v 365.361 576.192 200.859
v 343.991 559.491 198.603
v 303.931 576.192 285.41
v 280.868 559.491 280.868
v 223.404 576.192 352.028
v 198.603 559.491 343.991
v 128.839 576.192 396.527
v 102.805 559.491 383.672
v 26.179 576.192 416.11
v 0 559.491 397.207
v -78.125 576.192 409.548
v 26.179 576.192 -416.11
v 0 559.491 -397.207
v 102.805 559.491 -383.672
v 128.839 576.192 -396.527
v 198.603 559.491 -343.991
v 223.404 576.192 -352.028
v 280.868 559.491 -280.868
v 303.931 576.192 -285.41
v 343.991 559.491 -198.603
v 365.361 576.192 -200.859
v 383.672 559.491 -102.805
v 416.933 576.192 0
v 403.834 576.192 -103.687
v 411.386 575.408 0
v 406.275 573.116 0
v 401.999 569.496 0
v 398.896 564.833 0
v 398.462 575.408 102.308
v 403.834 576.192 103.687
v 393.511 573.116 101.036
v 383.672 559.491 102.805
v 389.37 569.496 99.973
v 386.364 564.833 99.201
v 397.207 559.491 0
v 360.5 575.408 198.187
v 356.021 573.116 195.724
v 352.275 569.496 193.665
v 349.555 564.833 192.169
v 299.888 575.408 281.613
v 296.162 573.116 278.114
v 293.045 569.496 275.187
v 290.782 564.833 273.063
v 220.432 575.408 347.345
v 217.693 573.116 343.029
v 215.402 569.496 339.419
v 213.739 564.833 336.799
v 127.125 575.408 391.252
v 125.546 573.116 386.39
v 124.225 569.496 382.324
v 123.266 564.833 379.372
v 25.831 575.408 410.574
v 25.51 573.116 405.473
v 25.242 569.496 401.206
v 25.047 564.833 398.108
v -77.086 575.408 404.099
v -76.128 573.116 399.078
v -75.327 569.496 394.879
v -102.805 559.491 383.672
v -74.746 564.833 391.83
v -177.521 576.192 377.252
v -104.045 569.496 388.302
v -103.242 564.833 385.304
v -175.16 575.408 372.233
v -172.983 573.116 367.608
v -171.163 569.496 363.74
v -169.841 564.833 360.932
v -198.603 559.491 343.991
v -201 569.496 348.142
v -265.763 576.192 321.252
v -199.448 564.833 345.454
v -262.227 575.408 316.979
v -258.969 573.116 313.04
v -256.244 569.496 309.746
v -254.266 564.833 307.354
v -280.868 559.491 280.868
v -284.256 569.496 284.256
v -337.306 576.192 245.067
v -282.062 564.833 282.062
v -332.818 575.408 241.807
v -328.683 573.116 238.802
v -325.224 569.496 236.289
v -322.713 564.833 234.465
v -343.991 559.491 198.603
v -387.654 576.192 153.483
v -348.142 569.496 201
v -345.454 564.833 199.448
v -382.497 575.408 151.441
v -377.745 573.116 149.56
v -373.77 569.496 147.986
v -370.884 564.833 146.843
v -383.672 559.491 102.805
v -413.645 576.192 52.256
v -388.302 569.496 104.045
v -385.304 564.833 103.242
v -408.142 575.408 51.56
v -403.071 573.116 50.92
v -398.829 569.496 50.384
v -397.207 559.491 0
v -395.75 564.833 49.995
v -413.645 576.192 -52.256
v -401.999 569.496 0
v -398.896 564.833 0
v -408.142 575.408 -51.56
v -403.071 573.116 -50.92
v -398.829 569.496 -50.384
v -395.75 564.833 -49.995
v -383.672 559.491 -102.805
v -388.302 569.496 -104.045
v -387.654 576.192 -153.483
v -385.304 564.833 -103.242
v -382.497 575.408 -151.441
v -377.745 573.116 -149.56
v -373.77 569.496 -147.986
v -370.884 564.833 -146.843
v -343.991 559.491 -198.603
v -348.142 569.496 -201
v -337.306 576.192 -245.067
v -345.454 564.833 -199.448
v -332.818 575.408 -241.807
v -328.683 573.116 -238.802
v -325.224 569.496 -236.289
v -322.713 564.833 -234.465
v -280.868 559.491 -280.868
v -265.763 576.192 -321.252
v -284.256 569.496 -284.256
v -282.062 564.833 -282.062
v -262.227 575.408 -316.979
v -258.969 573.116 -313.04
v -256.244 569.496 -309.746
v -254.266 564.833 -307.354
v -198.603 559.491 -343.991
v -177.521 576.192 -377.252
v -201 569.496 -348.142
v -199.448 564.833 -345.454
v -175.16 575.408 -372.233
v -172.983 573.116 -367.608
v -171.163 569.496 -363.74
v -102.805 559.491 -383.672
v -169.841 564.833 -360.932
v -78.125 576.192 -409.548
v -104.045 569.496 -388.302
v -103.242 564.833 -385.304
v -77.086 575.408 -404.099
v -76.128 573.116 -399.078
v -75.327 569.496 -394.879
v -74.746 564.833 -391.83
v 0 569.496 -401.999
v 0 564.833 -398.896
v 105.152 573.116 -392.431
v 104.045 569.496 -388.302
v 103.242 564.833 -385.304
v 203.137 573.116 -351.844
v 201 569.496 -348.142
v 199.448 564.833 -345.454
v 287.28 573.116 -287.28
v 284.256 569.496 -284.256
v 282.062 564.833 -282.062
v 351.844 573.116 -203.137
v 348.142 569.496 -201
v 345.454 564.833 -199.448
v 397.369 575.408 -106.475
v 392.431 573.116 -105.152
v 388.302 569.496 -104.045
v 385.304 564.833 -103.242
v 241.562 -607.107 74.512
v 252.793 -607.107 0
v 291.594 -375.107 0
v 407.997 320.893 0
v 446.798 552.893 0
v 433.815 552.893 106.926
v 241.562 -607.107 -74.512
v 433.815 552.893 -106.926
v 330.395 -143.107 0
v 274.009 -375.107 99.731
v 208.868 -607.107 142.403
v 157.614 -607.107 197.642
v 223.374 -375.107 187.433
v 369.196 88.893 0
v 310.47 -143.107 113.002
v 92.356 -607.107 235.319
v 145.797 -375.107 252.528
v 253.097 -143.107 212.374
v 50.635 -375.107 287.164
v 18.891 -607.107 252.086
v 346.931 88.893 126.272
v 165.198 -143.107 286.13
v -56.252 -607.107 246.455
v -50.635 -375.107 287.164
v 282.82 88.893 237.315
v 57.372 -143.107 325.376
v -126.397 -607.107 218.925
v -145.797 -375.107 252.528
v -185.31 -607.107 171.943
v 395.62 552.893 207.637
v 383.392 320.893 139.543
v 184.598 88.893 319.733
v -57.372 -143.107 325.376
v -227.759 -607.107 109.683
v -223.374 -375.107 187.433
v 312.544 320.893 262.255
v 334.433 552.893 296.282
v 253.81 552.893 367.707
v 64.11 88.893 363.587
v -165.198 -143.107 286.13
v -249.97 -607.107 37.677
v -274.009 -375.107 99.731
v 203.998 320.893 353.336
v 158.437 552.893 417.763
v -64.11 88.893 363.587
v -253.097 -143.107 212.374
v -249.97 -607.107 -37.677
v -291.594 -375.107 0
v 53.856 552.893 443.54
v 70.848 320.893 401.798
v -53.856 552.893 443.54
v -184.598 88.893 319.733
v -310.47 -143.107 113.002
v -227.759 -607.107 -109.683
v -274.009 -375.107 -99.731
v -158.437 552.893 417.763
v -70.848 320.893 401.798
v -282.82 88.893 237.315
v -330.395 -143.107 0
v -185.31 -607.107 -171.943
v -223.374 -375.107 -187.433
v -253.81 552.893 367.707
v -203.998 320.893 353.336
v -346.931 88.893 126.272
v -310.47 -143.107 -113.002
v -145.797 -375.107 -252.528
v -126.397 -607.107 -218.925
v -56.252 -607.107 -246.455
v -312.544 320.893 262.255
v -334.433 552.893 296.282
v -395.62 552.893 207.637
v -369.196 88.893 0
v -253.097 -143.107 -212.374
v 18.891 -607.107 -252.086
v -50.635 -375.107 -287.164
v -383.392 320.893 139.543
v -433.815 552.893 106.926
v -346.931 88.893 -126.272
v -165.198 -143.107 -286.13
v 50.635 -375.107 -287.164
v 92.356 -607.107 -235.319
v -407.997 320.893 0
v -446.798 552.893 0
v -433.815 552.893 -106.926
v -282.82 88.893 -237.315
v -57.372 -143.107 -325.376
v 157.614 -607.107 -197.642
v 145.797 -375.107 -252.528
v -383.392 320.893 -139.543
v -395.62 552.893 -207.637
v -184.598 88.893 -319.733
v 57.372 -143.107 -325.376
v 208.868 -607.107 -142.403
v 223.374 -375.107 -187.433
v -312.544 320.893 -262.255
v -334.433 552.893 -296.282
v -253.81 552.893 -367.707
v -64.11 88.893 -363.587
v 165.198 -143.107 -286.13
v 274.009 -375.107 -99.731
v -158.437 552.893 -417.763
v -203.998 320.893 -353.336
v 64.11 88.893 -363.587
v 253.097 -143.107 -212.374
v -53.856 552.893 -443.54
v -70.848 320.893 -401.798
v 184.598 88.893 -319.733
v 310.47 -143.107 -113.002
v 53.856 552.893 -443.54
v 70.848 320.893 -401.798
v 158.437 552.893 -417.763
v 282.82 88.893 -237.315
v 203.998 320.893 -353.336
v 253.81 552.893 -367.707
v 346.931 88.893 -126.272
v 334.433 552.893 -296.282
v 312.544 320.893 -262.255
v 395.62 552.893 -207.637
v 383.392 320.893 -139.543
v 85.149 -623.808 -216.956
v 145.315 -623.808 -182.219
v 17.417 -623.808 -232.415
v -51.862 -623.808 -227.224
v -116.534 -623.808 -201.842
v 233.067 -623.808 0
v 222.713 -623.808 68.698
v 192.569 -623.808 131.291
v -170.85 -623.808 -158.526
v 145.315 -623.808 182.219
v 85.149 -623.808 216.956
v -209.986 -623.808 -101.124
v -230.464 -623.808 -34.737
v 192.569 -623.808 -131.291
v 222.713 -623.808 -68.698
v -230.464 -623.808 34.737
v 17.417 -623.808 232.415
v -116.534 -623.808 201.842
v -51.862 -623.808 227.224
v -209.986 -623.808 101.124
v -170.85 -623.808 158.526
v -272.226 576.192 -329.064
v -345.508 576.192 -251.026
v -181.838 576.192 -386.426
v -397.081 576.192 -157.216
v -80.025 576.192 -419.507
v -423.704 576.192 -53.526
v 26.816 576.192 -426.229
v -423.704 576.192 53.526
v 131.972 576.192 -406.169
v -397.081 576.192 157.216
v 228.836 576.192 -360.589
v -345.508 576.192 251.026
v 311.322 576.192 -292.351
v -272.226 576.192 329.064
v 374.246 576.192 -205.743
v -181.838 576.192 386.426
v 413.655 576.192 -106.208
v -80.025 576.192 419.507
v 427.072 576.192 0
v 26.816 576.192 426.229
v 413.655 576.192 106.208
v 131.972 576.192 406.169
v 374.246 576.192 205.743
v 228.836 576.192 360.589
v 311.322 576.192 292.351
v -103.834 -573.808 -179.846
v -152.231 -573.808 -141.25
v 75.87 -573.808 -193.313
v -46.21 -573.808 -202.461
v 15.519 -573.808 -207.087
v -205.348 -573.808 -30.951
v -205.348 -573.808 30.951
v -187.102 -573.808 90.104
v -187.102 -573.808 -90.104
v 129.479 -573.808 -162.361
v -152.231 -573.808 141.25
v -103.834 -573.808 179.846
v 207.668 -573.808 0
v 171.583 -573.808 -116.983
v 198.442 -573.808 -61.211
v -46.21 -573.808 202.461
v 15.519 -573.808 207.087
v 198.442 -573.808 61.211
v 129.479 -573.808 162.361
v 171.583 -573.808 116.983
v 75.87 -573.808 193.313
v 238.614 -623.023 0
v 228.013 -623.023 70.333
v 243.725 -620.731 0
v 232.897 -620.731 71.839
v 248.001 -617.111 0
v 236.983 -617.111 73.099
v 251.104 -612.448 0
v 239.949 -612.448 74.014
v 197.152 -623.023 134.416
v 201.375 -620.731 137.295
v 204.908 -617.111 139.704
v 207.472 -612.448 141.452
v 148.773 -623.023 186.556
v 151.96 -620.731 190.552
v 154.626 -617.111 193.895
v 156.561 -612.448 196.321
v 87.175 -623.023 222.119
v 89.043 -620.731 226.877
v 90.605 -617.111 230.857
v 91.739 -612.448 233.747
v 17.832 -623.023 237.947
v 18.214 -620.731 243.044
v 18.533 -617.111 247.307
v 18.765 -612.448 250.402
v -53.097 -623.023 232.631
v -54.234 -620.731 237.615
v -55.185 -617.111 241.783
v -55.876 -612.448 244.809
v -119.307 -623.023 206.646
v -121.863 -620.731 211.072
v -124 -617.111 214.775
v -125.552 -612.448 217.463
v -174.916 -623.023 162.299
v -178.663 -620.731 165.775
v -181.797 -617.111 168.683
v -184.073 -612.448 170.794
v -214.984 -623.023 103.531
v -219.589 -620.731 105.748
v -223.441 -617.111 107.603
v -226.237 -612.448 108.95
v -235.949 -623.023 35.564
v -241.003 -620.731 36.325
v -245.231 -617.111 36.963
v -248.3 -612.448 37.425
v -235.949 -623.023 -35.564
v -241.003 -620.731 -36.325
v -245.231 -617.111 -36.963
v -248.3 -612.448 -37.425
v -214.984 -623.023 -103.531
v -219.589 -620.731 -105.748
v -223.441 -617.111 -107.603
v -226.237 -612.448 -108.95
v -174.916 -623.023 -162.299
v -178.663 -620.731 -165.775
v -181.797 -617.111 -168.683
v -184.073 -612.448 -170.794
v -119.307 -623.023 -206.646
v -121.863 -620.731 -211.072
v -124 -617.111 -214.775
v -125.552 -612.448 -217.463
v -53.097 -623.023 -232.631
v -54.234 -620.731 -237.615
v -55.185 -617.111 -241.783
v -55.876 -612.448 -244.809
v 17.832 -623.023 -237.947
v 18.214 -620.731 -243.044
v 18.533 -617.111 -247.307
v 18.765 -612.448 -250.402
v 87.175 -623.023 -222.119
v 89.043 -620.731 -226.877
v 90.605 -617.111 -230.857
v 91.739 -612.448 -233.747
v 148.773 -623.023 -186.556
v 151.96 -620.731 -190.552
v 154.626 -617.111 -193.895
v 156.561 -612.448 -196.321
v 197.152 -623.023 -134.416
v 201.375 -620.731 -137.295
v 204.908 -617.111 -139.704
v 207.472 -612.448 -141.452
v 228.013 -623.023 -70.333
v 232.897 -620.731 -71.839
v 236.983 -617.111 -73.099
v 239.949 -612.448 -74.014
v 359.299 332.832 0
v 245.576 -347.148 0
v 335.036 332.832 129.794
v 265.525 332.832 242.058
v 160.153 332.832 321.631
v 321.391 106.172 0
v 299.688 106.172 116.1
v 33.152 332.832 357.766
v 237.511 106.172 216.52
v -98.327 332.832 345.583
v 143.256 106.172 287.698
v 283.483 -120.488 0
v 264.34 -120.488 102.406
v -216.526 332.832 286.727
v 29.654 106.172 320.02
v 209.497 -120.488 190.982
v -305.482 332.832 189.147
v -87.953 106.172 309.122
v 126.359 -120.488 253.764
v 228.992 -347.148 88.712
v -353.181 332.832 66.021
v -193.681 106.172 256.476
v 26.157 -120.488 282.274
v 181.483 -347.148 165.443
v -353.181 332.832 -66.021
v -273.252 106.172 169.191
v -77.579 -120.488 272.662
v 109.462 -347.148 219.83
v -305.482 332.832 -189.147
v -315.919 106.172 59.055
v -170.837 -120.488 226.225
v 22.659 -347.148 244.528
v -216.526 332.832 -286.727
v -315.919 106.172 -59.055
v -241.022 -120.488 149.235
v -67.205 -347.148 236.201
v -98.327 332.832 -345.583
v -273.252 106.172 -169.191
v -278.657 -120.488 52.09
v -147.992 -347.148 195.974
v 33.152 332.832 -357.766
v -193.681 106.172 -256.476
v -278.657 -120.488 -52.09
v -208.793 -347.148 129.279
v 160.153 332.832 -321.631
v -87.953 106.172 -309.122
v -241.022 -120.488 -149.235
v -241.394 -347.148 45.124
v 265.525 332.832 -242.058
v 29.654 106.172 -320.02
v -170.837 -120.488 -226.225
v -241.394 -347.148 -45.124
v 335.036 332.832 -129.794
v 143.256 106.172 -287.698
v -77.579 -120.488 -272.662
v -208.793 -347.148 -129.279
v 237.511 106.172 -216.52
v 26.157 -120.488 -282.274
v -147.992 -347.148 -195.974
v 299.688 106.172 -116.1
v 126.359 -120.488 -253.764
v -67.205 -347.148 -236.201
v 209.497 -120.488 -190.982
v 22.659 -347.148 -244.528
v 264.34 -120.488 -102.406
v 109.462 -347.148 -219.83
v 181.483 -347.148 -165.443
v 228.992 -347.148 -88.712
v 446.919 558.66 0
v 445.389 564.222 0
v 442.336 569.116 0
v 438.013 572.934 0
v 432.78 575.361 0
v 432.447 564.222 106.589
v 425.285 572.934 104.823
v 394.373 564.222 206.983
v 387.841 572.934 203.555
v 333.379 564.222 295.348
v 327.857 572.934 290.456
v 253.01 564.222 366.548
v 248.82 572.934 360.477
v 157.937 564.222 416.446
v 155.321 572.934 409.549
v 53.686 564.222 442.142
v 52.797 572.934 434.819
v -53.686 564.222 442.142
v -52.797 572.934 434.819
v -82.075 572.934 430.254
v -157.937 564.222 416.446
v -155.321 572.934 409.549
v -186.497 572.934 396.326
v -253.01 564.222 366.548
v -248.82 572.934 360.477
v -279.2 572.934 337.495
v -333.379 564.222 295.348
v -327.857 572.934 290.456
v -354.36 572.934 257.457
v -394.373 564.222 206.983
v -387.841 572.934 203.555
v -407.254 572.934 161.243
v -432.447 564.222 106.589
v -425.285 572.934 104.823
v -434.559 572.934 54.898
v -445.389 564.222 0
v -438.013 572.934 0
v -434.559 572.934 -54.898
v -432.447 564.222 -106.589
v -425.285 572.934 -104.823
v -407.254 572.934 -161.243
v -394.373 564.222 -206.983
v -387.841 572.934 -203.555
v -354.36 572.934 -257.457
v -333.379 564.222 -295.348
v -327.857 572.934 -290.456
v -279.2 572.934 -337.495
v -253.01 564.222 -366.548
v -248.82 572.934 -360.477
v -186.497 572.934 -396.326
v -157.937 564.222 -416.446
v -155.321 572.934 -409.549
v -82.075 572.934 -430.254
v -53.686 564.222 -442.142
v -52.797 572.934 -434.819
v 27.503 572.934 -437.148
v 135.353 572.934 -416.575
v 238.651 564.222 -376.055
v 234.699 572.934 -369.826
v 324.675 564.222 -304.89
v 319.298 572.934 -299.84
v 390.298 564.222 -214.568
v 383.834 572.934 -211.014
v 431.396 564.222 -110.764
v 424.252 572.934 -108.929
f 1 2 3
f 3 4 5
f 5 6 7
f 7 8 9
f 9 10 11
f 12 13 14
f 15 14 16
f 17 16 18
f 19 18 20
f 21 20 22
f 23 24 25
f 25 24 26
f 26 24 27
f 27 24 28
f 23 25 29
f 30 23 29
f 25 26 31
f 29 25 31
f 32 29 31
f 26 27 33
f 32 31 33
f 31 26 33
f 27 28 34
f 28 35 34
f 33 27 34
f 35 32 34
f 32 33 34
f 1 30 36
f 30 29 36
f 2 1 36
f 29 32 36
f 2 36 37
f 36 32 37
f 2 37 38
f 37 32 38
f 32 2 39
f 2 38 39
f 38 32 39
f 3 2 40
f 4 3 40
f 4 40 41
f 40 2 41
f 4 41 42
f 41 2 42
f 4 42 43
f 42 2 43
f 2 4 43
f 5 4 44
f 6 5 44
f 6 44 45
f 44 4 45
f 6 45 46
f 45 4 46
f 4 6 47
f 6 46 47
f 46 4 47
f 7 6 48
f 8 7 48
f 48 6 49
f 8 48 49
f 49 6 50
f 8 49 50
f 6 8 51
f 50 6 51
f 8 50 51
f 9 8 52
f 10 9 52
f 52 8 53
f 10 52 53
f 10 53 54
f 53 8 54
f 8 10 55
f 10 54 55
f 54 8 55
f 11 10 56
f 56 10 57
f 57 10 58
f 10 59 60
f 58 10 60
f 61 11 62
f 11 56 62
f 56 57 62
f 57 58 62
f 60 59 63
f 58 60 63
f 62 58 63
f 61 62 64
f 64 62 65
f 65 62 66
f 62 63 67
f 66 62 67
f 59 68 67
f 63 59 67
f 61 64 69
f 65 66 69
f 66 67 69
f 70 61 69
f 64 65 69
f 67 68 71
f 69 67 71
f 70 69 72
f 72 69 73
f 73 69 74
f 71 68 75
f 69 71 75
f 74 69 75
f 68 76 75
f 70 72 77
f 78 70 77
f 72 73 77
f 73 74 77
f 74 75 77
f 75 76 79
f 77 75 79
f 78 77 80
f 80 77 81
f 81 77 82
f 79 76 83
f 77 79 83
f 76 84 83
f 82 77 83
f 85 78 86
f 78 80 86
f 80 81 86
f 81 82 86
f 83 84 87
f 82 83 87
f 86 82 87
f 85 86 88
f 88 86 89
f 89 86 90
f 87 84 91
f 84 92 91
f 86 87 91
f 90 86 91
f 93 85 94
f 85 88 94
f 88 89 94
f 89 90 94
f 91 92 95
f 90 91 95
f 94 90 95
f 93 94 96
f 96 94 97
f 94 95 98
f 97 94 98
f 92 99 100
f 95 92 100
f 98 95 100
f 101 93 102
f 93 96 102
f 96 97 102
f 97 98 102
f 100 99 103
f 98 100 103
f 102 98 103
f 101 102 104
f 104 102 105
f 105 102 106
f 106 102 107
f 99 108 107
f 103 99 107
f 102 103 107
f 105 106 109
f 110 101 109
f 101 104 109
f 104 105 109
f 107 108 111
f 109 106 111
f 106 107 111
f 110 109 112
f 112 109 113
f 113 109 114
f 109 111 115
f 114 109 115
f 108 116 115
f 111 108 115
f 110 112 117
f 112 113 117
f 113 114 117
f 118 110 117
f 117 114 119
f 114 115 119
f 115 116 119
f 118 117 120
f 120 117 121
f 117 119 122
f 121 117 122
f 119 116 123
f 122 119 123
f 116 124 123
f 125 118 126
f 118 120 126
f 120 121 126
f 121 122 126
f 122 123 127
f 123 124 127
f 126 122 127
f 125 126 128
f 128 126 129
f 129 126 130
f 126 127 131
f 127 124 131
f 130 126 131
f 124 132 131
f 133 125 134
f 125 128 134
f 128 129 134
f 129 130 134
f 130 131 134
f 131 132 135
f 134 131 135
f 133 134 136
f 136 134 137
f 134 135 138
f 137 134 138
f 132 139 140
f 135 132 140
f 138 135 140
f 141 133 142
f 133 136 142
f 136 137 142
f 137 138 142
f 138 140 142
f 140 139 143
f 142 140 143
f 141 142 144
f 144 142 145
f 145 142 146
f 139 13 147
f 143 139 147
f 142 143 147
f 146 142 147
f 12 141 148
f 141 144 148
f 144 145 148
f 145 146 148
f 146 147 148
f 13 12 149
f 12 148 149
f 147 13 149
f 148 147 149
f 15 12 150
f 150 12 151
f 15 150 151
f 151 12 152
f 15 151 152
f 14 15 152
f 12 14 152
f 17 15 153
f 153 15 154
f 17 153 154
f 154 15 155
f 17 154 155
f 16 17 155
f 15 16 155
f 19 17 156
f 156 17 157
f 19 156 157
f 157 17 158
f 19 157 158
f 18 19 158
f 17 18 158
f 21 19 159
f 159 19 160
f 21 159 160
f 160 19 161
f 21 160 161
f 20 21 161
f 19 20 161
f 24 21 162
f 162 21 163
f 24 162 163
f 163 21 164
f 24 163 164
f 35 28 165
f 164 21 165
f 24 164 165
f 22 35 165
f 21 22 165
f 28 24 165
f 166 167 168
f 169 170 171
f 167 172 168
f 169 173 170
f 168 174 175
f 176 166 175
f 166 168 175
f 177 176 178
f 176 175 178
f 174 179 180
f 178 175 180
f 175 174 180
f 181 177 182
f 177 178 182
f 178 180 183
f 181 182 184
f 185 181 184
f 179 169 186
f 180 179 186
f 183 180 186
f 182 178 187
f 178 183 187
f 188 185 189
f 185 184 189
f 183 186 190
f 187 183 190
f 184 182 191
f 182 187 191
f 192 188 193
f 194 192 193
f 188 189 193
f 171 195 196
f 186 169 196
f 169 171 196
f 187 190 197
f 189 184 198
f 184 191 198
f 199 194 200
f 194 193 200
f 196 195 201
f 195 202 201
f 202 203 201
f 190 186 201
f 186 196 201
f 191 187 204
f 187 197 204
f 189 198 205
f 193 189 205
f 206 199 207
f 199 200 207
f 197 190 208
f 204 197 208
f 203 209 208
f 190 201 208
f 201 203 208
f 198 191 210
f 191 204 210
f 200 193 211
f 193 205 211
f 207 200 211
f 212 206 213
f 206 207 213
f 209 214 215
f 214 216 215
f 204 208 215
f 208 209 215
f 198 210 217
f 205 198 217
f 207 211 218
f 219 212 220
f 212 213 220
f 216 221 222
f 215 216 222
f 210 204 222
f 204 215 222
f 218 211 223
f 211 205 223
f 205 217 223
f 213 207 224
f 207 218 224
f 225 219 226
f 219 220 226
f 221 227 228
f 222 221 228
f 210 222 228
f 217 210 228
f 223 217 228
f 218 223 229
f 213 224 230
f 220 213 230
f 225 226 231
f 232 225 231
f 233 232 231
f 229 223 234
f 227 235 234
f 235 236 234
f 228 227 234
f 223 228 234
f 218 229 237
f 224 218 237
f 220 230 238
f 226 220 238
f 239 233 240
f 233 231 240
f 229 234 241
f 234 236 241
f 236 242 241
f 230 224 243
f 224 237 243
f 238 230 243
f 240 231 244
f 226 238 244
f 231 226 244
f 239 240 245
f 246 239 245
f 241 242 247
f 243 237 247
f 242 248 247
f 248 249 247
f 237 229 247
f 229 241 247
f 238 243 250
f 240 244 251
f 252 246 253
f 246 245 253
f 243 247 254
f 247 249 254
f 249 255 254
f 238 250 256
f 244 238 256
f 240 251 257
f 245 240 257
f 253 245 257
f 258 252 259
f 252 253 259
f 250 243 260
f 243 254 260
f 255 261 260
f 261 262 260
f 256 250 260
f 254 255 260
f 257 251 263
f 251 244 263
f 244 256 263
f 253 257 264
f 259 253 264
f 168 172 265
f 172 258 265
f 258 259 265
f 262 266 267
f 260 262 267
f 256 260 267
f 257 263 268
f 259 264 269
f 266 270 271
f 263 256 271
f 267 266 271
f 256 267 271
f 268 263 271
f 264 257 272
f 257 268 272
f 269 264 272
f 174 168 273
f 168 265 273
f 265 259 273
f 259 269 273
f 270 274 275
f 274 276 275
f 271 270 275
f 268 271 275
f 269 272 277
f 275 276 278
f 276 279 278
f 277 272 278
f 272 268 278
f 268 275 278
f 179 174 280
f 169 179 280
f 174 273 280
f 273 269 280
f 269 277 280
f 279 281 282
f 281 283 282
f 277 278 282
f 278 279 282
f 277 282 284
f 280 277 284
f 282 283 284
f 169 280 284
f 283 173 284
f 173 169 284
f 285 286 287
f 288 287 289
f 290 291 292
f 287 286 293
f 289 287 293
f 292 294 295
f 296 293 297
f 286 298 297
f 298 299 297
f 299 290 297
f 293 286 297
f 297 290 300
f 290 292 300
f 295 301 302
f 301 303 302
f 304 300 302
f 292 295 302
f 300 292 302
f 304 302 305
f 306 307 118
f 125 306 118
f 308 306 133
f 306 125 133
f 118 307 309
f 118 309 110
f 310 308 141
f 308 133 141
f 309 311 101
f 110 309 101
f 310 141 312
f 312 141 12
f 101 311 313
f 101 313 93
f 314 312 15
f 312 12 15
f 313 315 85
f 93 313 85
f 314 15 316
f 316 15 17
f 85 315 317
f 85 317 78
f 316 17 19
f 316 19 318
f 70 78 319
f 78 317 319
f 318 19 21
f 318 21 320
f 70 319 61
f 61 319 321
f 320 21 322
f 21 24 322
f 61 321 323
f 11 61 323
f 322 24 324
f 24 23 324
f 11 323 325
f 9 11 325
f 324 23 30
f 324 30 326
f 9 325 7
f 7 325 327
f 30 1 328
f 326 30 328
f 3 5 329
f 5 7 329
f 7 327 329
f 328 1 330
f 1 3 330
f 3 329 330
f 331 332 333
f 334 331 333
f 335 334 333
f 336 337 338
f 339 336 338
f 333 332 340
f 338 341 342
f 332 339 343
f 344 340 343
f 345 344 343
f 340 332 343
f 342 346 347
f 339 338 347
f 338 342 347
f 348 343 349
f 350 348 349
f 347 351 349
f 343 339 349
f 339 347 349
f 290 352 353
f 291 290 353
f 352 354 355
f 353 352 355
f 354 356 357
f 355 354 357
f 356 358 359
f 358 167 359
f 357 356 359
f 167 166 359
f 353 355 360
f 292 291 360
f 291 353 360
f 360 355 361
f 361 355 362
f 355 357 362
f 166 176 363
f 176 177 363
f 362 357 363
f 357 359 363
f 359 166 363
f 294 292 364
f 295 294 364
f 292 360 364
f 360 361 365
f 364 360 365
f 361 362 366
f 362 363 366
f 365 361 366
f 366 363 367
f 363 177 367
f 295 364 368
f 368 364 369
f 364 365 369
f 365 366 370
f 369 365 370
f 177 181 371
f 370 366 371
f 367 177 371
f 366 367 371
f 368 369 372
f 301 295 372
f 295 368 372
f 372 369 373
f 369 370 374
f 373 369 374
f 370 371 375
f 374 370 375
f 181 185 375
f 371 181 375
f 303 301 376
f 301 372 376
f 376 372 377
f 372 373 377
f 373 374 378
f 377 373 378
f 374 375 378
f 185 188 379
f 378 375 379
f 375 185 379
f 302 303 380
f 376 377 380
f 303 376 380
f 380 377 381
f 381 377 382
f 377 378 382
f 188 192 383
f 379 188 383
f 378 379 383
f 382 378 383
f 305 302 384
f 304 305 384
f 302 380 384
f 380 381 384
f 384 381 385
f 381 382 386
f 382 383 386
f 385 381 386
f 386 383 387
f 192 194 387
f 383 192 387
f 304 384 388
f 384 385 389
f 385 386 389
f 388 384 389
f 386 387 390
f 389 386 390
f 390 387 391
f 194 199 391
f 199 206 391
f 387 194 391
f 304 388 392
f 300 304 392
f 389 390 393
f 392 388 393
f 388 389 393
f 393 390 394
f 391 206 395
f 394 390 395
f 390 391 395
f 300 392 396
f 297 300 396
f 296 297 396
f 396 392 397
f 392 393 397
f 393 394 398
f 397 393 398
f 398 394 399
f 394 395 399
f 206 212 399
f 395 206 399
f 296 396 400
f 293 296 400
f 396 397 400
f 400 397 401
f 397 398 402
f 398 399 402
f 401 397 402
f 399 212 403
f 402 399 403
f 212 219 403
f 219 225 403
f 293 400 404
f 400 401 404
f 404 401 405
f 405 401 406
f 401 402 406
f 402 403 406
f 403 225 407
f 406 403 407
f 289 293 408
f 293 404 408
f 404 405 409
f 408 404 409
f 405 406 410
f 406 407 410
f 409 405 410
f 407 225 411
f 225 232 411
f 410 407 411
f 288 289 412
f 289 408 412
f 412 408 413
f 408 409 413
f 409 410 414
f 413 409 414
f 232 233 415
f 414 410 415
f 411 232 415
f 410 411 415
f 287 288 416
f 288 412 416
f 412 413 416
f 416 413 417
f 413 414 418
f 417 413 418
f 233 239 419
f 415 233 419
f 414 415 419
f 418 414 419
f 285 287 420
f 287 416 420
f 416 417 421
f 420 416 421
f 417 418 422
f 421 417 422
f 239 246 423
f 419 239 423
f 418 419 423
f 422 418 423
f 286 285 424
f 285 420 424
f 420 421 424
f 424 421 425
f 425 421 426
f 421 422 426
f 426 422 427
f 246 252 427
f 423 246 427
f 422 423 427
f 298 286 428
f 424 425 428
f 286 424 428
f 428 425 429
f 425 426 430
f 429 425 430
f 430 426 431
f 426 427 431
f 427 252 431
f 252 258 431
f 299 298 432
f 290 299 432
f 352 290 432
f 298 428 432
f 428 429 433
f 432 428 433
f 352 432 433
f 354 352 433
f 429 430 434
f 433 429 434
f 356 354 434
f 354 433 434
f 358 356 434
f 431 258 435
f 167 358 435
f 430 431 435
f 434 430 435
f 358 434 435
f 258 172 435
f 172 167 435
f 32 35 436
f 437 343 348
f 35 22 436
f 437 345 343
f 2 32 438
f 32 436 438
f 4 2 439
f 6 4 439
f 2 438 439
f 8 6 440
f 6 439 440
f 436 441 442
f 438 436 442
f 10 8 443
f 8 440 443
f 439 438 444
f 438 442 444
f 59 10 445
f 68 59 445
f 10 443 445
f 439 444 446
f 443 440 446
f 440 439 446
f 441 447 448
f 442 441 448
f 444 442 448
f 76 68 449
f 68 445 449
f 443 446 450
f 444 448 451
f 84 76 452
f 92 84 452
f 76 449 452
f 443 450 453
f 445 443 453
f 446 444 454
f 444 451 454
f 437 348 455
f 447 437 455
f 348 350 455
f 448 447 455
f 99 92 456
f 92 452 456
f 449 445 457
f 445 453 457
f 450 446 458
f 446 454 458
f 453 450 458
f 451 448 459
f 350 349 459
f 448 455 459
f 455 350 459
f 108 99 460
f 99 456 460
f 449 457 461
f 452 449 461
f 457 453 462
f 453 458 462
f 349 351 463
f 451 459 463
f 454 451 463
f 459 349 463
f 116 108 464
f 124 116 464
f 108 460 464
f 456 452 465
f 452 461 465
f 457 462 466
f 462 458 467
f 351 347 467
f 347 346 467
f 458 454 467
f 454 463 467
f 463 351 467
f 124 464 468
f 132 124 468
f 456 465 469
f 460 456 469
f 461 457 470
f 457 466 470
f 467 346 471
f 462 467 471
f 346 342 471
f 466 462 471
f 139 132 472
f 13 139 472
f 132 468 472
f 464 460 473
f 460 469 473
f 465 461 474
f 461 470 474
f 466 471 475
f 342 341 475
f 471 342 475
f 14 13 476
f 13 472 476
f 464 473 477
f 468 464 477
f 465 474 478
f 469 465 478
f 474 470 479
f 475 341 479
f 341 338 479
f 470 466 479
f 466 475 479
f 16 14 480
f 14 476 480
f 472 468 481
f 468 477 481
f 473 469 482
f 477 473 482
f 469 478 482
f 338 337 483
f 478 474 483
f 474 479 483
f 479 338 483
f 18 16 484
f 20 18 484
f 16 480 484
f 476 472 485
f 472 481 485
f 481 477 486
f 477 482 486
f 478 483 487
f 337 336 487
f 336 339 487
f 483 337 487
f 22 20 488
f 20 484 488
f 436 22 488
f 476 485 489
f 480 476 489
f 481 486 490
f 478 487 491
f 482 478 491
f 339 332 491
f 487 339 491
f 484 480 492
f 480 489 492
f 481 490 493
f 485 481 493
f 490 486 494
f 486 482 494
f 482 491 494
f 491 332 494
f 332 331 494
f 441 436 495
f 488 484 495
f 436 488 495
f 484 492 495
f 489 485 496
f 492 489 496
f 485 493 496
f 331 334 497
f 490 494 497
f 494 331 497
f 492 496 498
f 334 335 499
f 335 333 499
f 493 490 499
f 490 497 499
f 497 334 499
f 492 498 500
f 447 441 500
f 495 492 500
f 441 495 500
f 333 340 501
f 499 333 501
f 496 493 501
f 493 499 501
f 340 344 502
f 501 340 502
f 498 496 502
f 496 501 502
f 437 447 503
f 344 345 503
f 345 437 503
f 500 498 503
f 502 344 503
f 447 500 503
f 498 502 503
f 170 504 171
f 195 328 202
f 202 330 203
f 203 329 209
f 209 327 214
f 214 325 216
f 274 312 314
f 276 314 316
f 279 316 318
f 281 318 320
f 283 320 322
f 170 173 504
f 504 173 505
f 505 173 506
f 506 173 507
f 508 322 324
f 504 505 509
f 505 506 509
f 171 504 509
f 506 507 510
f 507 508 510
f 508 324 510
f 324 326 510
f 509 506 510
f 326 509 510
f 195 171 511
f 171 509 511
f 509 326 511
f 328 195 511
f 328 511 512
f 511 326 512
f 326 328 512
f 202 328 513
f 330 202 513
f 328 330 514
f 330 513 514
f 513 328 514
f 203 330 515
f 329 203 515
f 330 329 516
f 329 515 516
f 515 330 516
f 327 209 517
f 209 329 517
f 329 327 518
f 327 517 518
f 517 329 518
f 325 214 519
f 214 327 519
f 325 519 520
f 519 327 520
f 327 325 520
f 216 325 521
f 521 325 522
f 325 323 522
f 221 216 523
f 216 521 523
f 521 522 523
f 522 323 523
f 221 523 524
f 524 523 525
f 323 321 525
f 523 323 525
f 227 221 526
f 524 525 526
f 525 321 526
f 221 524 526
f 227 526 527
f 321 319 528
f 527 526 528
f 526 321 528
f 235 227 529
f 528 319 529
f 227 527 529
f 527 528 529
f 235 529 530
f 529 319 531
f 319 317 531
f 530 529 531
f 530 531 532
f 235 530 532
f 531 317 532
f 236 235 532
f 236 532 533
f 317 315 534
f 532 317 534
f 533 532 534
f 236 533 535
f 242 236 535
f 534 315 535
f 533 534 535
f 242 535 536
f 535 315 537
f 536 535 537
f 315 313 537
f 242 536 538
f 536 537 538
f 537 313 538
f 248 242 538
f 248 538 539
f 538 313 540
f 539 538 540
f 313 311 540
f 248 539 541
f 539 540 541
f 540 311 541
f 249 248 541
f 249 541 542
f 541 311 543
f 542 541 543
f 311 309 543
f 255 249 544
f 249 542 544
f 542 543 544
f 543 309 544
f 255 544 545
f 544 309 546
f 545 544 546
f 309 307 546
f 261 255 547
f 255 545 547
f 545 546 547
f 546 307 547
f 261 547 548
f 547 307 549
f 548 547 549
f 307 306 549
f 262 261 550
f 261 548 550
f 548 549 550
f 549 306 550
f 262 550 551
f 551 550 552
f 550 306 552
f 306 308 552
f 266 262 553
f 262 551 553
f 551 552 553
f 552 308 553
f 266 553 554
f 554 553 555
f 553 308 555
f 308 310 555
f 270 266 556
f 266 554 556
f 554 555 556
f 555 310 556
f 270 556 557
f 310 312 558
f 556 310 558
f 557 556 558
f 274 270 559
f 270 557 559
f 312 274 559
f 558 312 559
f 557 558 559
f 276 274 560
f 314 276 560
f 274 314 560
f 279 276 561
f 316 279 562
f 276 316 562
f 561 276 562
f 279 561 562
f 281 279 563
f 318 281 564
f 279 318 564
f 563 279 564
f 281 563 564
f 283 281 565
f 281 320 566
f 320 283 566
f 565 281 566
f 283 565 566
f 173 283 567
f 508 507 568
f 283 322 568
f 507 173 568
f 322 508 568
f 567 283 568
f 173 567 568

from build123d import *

# Parameters (mm, degrees)
FILLET1_R = 20


with BuildPart() as part:
    # Sketch1 → Revolve1 (revolve)
    with BuildSketch(Plane.XY):
        Polygon((0, -573.807622343), (0, -623.807622343), (250, -623.807622343), (450.694452759, 576.192377657), (400, 576.192377657), (207.667816106, -573.807622343), align=None)
    revolve(axis=Axis((0, 411.869437483, 0), (0, -1, 0)))

    # Fillet1
    fillet1_edges = [part.edges().sort_by_distance(p)[0] for p in [
        (-400, 576.192377657, 0),
        (-450.694452759, 576.192377657, 0),
        (-250, -623.807622343, 0),
    ]]
    fillet(fillet1_edges, radius=FILLET1_R)


solid = part.part
